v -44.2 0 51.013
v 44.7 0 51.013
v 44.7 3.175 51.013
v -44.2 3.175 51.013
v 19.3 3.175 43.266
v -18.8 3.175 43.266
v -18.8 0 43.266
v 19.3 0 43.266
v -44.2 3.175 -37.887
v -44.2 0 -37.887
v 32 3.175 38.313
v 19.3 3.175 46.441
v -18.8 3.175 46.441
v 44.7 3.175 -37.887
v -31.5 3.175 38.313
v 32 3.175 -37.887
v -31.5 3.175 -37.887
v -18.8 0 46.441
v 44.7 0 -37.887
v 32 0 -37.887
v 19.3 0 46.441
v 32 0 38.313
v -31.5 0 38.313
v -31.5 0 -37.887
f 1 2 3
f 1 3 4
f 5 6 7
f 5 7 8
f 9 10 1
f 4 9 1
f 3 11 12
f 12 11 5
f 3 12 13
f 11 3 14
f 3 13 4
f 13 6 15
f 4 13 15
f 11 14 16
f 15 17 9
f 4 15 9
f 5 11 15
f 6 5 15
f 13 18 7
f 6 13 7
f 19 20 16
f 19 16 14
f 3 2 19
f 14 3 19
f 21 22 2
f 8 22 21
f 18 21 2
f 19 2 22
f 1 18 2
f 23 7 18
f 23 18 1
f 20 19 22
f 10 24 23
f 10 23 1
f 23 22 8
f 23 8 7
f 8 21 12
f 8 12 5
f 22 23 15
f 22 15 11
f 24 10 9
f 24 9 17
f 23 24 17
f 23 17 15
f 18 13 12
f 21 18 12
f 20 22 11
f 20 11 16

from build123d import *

# Parameters (mm, degrees)
BOSS_EXTRUDE1_DEPTH = 3.175
SKETCH3_W           = 38.1
SKETCH3_H           = 3.175
CUT_EXTRUDE1_DEPTH  = 3.175


with BuildPart() as part:
    # Sketch2 → Boss-Extrude1 (new body)
    with BuildSketch(Plane(origin=(0, 0, 0), x_dir=(1, 0, 0), z_dir=(0, 1, 0))):
        Polygon((-44.199800383, 37.887467748), (-31.499800383, 37.887467748), (-31.499800383, -38.312532252), (32.000199617, -38.312532252), (32.000199617, 37.887467748), (44.700199617, 37.887467748), (44.700199617, -38.312532252), (44.700199617, -51.012532252), (-44.199800383, -51.012532252), (-44.199800383, -38.312532252), align=None)
    extrude(amount=BOSS_EXTRUDE1_DEPTH)

    # Sketch3 → Cut-Extrude1 (cut)
    with BuildSketch(Plane(origin=(0, 3.175, 0), x_dir=(1, 0, 0), z_dir=(0, 1, 0))):
        with Locations((0.250199617, -44.853032252)):
            Rectangle(SKETCH3_W, SKETCH3_H)
    extrude(amount=-CUT_EXTRUDE1_DEPTH, mode=Mode.SUBTRACT)


solid = part.part
